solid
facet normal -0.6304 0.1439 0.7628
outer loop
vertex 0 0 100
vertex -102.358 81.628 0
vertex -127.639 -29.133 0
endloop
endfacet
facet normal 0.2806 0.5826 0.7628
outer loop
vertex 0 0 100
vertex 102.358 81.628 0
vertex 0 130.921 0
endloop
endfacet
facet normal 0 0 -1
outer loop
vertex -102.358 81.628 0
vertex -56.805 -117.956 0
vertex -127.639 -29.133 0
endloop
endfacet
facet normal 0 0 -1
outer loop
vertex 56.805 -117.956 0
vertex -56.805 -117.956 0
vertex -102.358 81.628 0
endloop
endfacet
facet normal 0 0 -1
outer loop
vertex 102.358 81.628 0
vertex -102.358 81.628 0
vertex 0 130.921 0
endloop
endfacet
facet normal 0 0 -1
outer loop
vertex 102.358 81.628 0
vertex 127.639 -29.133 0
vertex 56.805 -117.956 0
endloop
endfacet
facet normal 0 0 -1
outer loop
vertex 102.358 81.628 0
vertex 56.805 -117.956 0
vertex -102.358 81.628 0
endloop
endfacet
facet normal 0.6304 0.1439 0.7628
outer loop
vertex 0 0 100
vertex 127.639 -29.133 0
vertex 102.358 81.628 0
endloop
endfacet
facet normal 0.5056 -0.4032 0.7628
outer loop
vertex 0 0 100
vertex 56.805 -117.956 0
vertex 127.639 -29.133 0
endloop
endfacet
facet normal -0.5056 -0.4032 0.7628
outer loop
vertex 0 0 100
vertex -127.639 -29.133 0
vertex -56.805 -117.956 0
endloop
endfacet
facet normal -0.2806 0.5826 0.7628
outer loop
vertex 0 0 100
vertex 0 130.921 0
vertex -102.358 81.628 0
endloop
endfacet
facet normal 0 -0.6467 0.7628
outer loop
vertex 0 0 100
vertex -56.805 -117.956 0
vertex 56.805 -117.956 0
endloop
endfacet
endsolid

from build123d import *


with BuildPart() as f3:
    # F0 (on Top) → F3 section 0
    with BuildSketch(Plane.XY, mode=Mode.PRIVATE) as f3_s0:
        Polygon((-56.804541, -117.955845), (56.804541, -117.955845), (127.638645, -29.132688), (102.358246, 81.627977), (0, 130.921111), (-102.358246, 81.627977), (-127.638645, -29.132688), align=None)
    loft([f3_s0.sketch, Vertex(0, 0, 100)])


solid = f3.part
